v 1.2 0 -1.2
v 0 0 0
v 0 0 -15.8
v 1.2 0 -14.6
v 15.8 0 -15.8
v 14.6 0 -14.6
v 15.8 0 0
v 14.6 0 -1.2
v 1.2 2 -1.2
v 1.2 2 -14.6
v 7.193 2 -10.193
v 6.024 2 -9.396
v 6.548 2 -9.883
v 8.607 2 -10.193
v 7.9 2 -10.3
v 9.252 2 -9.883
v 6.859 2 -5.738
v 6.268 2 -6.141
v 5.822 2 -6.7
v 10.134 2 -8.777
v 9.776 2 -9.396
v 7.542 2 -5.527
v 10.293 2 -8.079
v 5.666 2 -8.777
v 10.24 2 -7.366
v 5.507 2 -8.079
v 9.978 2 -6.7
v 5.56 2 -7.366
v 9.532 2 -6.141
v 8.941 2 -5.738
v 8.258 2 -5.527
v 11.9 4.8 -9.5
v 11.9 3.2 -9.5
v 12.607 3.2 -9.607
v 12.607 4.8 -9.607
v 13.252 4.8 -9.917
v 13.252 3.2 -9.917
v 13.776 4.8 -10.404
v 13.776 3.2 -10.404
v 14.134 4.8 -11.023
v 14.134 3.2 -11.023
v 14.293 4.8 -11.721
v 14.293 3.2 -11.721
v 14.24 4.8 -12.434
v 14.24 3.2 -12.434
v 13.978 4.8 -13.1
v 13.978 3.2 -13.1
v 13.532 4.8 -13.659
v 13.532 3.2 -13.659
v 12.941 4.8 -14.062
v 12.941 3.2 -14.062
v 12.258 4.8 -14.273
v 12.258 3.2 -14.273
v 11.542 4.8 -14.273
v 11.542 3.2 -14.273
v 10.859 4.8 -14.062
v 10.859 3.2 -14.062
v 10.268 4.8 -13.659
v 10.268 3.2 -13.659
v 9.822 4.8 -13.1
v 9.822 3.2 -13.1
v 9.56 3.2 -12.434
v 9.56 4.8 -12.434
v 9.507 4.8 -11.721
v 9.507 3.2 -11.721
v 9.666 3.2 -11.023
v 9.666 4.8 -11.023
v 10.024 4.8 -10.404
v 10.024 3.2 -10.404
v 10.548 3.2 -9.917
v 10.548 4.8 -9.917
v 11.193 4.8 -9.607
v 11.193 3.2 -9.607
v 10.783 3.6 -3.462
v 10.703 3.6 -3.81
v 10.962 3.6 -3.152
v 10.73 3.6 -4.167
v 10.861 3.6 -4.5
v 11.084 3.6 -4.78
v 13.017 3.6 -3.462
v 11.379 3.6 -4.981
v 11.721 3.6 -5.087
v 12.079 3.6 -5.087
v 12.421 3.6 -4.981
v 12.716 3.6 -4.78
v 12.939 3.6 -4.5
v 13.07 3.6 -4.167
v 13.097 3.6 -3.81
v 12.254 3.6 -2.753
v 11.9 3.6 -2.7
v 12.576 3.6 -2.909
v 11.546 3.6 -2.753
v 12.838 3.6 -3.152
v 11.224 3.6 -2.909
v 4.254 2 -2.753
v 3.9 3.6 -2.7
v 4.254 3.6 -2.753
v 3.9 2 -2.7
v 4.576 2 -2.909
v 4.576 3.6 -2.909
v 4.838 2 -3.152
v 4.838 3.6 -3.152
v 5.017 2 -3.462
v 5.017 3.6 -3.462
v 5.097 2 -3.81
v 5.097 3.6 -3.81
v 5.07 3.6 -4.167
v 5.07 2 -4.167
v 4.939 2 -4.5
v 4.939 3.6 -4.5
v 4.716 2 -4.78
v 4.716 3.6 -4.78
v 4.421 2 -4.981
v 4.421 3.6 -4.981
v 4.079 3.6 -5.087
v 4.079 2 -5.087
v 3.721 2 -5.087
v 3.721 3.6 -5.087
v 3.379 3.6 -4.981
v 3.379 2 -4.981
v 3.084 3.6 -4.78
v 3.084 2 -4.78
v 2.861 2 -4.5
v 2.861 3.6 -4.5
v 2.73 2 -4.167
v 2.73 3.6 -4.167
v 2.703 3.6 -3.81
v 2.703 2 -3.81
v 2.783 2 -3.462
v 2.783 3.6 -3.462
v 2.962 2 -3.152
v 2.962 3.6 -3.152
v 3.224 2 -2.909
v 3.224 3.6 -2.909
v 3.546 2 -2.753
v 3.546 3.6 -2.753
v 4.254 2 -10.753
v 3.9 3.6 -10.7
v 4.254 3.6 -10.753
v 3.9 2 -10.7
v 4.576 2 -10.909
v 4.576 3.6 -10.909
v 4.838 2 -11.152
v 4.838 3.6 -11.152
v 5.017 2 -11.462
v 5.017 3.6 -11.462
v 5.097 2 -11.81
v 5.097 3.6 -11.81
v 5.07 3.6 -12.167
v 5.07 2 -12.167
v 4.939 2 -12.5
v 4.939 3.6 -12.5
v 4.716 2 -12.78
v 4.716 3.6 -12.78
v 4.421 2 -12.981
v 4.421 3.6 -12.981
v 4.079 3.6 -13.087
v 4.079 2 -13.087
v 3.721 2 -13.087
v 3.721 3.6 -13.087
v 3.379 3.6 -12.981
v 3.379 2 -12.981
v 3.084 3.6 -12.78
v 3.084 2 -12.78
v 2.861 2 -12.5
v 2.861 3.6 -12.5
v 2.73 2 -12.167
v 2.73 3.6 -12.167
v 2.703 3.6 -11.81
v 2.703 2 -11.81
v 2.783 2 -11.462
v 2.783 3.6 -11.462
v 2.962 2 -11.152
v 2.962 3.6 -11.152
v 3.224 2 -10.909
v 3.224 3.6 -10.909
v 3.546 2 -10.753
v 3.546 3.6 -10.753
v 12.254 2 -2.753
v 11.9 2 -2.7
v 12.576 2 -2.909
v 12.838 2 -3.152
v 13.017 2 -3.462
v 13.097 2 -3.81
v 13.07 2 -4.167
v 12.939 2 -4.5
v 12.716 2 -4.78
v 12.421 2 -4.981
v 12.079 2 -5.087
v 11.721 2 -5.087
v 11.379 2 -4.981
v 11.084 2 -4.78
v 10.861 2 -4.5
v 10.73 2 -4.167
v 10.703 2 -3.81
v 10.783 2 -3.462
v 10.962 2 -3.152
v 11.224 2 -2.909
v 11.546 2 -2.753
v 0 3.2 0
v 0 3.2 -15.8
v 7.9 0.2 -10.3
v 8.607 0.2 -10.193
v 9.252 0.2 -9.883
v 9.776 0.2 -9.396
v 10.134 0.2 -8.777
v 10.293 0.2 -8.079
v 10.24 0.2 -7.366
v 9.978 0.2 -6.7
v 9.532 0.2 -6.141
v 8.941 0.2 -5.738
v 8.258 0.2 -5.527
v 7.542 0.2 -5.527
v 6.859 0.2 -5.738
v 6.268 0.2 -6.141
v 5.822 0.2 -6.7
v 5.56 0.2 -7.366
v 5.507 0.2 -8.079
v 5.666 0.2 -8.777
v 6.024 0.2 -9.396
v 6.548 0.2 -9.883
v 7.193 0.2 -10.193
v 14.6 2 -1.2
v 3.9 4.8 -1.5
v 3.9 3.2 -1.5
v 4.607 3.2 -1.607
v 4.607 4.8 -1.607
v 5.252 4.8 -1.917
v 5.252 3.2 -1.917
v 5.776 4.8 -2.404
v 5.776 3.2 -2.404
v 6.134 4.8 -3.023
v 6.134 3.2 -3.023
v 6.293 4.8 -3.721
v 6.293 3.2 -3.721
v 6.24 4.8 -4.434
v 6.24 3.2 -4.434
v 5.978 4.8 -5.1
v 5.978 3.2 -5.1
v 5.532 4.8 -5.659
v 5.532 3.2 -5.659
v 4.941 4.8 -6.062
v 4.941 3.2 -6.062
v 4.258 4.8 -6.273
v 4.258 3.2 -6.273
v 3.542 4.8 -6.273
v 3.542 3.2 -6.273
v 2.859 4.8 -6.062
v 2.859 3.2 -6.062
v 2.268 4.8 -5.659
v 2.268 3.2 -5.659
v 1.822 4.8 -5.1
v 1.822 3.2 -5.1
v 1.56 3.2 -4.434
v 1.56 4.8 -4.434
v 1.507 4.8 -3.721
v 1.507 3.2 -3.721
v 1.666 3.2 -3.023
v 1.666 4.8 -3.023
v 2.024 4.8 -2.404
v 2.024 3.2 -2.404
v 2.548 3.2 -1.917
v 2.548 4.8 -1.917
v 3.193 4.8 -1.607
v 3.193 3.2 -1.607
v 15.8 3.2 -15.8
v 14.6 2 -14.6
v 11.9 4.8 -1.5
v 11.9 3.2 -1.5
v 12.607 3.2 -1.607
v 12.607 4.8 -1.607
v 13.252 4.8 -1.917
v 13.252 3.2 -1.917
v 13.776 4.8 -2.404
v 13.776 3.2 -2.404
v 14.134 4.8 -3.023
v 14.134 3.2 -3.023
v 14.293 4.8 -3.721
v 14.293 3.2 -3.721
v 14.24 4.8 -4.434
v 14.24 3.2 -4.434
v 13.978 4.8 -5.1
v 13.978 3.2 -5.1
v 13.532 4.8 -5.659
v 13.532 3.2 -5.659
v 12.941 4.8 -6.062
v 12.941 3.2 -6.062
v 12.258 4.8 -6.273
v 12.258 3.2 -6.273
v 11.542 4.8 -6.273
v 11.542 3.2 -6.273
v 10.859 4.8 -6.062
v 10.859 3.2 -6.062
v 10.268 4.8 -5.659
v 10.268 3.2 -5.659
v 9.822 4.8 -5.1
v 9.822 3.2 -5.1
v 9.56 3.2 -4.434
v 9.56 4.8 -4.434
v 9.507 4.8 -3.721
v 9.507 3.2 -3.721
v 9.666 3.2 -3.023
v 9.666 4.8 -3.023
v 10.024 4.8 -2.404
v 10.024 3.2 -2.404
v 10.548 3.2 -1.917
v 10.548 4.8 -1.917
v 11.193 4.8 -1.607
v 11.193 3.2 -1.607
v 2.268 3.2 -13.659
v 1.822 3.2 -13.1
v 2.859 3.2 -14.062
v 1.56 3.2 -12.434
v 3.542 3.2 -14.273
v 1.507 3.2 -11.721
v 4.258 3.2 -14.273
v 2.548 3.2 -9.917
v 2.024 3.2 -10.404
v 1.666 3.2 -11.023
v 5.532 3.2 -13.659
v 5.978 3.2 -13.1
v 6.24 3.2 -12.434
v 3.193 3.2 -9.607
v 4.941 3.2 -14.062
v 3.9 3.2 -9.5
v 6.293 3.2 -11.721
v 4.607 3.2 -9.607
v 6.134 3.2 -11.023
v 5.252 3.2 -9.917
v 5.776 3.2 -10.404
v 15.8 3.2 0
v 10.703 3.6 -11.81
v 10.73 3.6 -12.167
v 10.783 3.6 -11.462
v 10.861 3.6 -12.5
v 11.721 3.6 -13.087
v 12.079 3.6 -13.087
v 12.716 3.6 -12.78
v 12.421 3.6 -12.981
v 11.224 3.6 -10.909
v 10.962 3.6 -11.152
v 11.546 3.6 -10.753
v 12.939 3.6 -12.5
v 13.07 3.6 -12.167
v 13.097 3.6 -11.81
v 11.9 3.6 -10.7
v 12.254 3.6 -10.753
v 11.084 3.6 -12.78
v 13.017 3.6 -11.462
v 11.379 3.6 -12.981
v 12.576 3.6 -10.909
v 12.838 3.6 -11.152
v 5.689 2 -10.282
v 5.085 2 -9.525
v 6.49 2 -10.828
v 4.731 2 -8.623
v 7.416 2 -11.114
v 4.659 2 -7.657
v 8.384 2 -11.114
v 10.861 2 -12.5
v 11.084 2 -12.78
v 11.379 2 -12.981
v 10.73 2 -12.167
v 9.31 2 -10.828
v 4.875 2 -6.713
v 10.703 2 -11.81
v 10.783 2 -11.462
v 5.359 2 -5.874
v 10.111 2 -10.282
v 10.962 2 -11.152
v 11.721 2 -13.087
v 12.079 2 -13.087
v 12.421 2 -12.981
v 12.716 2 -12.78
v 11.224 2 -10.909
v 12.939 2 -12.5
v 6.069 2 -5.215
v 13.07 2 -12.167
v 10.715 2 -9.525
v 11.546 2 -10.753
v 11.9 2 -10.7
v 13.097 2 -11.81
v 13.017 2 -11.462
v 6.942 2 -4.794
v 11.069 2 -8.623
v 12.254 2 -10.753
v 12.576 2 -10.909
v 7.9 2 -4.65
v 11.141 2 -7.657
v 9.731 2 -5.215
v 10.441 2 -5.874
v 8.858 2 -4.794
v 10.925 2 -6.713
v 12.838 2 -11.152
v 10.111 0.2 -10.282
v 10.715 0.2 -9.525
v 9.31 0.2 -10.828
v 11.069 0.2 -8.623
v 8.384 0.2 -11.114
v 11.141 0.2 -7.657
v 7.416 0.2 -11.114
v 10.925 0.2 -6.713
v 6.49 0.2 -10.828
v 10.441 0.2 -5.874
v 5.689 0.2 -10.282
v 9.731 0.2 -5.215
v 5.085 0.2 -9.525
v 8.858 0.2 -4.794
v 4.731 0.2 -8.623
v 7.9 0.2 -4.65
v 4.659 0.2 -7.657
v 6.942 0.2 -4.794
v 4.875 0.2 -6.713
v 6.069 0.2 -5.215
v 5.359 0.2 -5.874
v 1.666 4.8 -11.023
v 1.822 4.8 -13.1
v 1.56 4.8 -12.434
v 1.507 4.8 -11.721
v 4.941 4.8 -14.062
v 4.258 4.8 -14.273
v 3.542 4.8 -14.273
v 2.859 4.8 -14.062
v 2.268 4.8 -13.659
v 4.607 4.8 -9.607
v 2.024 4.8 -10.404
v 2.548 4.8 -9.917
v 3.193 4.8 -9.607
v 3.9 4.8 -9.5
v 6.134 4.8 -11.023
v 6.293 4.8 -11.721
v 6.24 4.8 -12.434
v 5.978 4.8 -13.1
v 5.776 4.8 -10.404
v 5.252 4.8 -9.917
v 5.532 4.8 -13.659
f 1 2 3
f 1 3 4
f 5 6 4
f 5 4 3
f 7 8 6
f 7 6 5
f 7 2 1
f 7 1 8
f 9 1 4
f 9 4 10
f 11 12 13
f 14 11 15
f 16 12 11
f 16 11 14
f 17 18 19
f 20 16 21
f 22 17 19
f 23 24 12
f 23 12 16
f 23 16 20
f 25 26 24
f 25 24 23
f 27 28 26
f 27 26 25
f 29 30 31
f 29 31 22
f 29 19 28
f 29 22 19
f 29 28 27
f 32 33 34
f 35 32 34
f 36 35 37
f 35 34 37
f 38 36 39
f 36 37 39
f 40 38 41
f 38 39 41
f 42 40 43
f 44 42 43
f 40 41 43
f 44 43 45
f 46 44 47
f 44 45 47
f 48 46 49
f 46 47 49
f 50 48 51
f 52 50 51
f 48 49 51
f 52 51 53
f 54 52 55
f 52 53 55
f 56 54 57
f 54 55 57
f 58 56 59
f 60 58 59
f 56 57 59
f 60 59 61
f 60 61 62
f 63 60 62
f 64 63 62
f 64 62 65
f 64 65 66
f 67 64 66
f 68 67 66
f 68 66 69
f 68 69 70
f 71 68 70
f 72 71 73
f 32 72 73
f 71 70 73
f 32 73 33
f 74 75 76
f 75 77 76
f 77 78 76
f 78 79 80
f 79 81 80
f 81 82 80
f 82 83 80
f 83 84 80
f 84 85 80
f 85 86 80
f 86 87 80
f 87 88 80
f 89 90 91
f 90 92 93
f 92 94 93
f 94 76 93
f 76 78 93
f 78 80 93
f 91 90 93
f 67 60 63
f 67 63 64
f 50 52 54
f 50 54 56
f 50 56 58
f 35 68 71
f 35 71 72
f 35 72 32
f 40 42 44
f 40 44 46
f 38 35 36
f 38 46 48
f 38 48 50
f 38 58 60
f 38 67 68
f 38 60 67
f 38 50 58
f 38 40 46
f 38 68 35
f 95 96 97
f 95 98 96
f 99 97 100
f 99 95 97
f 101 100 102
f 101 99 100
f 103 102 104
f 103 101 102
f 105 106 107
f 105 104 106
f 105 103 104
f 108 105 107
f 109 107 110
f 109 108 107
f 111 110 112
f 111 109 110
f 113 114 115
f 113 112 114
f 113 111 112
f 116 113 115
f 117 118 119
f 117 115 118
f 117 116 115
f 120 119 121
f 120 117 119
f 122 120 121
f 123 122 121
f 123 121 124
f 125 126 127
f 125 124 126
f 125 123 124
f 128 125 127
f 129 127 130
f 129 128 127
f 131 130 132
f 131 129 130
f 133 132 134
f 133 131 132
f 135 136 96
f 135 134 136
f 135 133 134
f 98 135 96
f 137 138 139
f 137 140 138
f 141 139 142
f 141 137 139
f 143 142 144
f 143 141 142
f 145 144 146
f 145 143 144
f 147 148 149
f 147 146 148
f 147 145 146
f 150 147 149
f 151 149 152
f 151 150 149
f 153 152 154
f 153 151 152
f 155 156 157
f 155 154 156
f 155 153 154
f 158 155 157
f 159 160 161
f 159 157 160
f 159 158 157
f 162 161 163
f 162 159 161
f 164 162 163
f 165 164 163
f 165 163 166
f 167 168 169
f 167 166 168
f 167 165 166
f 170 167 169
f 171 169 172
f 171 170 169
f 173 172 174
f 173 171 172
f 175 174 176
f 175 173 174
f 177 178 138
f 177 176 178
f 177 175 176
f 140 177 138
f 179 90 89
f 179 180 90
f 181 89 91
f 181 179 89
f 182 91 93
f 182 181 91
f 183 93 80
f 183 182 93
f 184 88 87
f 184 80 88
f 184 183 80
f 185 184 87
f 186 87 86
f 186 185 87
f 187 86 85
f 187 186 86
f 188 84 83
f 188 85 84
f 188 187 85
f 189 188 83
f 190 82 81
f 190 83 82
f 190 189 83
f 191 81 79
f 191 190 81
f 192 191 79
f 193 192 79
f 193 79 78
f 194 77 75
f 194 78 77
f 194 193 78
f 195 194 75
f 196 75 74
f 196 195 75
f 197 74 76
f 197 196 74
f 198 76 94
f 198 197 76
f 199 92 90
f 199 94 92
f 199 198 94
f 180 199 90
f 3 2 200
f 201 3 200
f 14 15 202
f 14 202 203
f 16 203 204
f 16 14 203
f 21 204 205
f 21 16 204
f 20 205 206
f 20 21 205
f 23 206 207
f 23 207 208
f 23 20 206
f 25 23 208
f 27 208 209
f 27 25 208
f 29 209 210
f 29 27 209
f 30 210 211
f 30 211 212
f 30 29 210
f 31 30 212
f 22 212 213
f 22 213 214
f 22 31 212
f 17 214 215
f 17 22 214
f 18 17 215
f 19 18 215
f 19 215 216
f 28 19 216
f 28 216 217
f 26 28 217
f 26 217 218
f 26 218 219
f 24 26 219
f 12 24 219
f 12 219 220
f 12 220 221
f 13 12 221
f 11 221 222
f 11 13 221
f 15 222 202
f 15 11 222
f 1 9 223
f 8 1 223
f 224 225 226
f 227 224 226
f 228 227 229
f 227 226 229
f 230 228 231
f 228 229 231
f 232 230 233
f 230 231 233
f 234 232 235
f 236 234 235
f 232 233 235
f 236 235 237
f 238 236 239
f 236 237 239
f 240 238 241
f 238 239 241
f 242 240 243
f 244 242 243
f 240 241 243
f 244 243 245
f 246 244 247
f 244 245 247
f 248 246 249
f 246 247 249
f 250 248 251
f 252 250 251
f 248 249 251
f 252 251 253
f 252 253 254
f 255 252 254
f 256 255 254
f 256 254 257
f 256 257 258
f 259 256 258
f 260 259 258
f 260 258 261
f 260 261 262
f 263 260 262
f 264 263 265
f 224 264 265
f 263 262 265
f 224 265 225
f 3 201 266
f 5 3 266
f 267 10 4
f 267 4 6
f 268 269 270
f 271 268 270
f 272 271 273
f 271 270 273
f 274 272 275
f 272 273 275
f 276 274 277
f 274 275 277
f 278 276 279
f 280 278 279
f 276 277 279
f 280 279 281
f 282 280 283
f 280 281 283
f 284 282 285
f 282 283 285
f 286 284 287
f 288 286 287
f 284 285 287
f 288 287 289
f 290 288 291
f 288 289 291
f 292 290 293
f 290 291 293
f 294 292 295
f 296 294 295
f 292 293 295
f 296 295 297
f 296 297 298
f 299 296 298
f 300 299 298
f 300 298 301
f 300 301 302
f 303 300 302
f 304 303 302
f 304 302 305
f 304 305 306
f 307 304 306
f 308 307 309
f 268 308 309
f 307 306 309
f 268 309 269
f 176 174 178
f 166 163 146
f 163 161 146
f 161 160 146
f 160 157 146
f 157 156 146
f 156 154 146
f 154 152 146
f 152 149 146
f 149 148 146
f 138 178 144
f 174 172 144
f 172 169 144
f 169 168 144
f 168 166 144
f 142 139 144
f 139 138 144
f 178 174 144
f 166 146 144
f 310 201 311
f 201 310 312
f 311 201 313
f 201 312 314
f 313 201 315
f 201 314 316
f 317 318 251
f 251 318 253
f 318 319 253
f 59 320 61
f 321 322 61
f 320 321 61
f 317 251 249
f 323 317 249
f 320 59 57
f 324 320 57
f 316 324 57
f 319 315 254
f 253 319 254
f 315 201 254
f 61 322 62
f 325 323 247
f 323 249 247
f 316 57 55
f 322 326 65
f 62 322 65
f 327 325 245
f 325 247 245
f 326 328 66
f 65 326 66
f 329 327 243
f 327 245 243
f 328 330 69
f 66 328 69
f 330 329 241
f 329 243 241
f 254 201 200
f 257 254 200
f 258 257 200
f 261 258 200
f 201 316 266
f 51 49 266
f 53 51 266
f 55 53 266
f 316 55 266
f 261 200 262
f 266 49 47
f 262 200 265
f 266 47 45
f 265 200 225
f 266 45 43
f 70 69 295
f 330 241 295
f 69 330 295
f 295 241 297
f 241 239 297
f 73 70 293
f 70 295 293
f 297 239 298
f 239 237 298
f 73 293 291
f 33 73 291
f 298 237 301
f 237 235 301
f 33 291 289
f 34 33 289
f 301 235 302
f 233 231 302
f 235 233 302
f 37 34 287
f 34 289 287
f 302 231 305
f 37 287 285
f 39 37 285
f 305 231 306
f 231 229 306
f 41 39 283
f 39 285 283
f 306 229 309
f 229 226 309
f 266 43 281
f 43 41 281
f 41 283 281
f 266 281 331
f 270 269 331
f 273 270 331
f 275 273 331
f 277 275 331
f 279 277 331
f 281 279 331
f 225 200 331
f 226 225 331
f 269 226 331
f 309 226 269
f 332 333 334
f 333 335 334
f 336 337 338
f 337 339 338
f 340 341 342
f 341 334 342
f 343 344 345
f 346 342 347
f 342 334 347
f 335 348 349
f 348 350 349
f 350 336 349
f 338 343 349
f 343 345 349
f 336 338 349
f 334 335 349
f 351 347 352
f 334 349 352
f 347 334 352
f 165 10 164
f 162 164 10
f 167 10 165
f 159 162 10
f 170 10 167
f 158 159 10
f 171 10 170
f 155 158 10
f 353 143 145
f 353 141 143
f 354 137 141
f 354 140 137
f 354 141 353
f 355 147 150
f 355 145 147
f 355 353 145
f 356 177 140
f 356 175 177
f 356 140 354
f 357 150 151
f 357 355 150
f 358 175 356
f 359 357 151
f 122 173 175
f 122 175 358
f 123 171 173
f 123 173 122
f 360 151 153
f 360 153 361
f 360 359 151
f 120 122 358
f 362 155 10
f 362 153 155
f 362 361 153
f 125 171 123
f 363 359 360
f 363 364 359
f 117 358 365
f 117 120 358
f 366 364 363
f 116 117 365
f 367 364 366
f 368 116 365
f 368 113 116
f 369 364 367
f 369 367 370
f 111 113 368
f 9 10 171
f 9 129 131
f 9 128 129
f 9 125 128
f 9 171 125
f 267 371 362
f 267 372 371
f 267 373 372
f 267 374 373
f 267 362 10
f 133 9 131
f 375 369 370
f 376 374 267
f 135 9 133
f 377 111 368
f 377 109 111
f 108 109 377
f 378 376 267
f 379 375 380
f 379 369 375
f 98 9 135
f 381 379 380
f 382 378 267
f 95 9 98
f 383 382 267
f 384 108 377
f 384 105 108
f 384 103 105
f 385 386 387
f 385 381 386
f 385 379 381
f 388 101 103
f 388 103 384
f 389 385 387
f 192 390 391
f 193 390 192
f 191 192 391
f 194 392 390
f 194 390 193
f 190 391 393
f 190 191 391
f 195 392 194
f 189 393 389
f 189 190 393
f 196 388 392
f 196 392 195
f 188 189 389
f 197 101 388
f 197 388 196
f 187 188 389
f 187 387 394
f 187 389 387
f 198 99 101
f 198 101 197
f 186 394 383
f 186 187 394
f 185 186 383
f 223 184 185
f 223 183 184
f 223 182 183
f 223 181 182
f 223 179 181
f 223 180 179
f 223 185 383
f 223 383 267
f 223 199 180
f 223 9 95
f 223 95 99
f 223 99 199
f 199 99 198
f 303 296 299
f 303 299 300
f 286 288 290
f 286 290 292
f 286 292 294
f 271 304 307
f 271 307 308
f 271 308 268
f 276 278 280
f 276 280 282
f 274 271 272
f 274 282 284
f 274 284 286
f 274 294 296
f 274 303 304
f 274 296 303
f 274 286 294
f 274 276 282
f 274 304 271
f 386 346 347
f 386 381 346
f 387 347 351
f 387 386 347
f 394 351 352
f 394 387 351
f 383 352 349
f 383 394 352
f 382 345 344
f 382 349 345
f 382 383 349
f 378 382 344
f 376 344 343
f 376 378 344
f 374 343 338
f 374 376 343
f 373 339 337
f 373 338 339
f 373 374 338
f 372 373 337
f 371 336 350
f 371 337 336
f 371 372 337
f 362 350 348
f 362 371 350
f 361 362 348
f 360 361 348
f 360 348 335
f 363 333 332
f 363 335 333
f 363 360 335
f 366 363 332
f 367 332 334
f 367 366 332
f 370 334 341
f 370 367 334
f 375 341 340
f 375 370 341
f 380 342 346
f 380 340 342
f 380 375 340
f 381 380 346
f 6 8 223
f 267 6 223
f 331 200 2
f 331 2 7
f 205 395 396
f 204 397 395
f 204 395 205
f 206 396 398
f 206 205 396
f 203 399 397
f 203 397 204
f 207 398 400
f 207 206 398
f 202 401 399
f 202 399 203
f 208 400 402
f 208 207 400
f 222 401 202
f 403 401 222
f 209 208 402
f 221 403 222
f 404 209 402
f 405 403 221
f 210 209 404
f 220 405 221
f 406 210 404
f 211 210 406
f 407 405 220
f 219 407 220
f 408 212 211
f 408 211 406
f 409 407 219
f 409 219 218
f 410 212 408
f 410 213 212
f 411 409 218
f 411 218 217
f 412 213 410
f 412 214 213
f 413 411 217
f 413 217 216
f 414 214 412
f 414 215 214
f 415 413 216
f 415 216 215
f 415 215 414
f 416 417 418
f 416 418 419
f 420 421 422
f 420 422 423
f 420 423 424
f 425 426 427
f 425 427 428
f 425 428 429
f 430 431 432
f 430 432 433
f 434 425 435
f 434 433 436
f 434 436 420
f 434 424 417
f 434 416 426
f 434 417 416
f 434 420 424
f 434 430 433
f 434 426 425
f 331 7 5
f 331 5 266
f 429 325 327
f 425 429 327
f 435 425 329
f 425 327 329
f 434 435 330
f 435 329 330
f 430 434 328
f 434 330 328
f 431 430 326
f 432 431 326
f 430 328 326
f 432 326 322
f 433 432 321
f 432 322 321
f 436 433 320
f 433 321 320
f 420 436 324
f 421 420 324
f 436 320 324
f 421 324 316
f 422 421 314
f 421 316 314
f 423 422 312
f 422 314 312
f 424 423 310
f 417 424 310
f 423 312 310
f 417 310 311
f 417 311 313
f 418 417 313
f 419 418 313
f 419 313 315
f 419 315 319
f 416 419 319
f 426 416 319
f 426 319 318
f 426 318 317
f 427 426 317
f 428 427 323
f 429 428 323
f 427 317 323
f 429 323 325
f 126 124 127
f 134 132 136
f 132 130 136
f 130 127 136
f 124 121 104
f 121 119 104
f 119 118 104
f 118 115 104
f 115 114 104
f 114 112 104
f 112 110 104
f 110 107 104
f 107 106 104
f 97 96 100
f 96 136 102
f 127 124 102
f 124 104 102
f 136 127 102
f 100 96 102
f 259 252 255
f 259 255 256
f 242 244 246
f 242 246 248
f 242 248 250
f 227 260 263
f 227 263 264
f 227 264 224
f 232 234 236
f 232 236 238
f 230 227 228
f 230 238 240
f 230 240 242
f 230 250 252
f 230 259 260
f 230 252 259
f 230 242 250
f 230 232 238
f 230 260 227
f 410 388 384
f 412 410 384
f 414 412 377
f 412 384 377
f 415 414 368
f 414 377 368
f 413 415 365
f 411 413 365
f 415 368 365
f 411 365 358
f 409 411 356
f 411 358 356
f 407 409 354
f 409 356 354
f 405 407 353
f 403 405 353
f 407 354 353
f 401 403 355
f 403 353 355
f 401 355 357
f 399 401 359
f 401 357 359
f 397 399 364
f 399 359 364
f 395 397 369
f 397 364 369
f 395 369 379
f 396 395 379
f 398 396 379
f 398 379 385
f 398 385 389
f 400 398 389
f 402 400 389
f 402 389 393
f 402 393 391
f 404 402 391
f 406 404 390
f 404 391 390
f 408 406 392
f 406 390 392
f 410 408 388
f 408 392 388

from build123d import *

# Parameters (mm, degrees)
SKETCH1_W            = 15.8
SKETCH1_H            = 3.2
BOSS_EXTRUDE1_DEPTH  = 15.8
SKETCH2_R            = 2.4
BOSS_EXTRUDE2_DEPTH  = 1.6
LPATTERN1_COUNT      = 2
LPATTERN1_PITCH      = 8
LPATTERN1_COUNT_DIR2 = 4
LPATTERN1_PITCH_DIR2 = 8
SHELL1_T             = -1.2
SKETCH4_R            = 3.25
SKETCH4_R_2          = 2.4
BOSS_EXTRUDE3_DEPTH  = 1.8


with BuildPart() as part:
    # Sketch1 → Boss-Extrude1 (new body)
    with BuildSketch(Plane.XY):
        with Locations((7.9, 1.6)):
            Rectangle(SKETCH1_W, SKETCH1_H)
    extrude(amount=-BOSS_EXTRUDE1_DEPTH)

    # Sketch2 → Boss-Extrude2 (add)
    with BuildSketch(Plane(origin=(0, 3.2, 0), x_dir=(1, 0, 0), z_dir=(0, 1, 0))):
        with Locations(Location((3.9, 3.9, 0), (0, 0, 270))):
            Circle(SKETCH2_R)
    boss_extrude2 = extrude(amount=BOSS_EXTRUDE2_DEPTH)

    # LPattern1: Boss-Extrude2 2 × 4, 4 skipped
    with Locations(*[(j * LPATTERN1_PITCH_DIR2, 0, -i * LPATTERN1_PITCH) for i in range(LPATTERN1_COUNT) for j in range(LPATTERN1_COUNT_DIR2) if (i, j) not in ((0, 0), (0, 2), (0, 3), (1, 2), (1, 3))]):
        add(boss_extrude2)

    # Shell1
    shell1_openings = [part.faces().sort_by_distance(p)[0] for p in [
        (7.9, 0, -7.9),
    ]]
    offset(amount=SHELL1_T, openings=shell1_openings, kind=Kind.INTERSECTION)

    # Sketch4 → Boss-Extrude3 (add)
    with BuildSketch(Plane.XZ.offset(-2)):
        with Locations(Location((7.9, -7.9, 0), (0, 0, 90))):
            Circle(SKETCH4_R)
        with Locations(Location((7.9, -7.9, 0), (0, 0, 270))):
            Circle(SKETCH4_R_2, mode=Mode.SUBTRACT)
    extrude(amount=BOSS_EXTRUDE3_DEPTH)


solid = part.part
